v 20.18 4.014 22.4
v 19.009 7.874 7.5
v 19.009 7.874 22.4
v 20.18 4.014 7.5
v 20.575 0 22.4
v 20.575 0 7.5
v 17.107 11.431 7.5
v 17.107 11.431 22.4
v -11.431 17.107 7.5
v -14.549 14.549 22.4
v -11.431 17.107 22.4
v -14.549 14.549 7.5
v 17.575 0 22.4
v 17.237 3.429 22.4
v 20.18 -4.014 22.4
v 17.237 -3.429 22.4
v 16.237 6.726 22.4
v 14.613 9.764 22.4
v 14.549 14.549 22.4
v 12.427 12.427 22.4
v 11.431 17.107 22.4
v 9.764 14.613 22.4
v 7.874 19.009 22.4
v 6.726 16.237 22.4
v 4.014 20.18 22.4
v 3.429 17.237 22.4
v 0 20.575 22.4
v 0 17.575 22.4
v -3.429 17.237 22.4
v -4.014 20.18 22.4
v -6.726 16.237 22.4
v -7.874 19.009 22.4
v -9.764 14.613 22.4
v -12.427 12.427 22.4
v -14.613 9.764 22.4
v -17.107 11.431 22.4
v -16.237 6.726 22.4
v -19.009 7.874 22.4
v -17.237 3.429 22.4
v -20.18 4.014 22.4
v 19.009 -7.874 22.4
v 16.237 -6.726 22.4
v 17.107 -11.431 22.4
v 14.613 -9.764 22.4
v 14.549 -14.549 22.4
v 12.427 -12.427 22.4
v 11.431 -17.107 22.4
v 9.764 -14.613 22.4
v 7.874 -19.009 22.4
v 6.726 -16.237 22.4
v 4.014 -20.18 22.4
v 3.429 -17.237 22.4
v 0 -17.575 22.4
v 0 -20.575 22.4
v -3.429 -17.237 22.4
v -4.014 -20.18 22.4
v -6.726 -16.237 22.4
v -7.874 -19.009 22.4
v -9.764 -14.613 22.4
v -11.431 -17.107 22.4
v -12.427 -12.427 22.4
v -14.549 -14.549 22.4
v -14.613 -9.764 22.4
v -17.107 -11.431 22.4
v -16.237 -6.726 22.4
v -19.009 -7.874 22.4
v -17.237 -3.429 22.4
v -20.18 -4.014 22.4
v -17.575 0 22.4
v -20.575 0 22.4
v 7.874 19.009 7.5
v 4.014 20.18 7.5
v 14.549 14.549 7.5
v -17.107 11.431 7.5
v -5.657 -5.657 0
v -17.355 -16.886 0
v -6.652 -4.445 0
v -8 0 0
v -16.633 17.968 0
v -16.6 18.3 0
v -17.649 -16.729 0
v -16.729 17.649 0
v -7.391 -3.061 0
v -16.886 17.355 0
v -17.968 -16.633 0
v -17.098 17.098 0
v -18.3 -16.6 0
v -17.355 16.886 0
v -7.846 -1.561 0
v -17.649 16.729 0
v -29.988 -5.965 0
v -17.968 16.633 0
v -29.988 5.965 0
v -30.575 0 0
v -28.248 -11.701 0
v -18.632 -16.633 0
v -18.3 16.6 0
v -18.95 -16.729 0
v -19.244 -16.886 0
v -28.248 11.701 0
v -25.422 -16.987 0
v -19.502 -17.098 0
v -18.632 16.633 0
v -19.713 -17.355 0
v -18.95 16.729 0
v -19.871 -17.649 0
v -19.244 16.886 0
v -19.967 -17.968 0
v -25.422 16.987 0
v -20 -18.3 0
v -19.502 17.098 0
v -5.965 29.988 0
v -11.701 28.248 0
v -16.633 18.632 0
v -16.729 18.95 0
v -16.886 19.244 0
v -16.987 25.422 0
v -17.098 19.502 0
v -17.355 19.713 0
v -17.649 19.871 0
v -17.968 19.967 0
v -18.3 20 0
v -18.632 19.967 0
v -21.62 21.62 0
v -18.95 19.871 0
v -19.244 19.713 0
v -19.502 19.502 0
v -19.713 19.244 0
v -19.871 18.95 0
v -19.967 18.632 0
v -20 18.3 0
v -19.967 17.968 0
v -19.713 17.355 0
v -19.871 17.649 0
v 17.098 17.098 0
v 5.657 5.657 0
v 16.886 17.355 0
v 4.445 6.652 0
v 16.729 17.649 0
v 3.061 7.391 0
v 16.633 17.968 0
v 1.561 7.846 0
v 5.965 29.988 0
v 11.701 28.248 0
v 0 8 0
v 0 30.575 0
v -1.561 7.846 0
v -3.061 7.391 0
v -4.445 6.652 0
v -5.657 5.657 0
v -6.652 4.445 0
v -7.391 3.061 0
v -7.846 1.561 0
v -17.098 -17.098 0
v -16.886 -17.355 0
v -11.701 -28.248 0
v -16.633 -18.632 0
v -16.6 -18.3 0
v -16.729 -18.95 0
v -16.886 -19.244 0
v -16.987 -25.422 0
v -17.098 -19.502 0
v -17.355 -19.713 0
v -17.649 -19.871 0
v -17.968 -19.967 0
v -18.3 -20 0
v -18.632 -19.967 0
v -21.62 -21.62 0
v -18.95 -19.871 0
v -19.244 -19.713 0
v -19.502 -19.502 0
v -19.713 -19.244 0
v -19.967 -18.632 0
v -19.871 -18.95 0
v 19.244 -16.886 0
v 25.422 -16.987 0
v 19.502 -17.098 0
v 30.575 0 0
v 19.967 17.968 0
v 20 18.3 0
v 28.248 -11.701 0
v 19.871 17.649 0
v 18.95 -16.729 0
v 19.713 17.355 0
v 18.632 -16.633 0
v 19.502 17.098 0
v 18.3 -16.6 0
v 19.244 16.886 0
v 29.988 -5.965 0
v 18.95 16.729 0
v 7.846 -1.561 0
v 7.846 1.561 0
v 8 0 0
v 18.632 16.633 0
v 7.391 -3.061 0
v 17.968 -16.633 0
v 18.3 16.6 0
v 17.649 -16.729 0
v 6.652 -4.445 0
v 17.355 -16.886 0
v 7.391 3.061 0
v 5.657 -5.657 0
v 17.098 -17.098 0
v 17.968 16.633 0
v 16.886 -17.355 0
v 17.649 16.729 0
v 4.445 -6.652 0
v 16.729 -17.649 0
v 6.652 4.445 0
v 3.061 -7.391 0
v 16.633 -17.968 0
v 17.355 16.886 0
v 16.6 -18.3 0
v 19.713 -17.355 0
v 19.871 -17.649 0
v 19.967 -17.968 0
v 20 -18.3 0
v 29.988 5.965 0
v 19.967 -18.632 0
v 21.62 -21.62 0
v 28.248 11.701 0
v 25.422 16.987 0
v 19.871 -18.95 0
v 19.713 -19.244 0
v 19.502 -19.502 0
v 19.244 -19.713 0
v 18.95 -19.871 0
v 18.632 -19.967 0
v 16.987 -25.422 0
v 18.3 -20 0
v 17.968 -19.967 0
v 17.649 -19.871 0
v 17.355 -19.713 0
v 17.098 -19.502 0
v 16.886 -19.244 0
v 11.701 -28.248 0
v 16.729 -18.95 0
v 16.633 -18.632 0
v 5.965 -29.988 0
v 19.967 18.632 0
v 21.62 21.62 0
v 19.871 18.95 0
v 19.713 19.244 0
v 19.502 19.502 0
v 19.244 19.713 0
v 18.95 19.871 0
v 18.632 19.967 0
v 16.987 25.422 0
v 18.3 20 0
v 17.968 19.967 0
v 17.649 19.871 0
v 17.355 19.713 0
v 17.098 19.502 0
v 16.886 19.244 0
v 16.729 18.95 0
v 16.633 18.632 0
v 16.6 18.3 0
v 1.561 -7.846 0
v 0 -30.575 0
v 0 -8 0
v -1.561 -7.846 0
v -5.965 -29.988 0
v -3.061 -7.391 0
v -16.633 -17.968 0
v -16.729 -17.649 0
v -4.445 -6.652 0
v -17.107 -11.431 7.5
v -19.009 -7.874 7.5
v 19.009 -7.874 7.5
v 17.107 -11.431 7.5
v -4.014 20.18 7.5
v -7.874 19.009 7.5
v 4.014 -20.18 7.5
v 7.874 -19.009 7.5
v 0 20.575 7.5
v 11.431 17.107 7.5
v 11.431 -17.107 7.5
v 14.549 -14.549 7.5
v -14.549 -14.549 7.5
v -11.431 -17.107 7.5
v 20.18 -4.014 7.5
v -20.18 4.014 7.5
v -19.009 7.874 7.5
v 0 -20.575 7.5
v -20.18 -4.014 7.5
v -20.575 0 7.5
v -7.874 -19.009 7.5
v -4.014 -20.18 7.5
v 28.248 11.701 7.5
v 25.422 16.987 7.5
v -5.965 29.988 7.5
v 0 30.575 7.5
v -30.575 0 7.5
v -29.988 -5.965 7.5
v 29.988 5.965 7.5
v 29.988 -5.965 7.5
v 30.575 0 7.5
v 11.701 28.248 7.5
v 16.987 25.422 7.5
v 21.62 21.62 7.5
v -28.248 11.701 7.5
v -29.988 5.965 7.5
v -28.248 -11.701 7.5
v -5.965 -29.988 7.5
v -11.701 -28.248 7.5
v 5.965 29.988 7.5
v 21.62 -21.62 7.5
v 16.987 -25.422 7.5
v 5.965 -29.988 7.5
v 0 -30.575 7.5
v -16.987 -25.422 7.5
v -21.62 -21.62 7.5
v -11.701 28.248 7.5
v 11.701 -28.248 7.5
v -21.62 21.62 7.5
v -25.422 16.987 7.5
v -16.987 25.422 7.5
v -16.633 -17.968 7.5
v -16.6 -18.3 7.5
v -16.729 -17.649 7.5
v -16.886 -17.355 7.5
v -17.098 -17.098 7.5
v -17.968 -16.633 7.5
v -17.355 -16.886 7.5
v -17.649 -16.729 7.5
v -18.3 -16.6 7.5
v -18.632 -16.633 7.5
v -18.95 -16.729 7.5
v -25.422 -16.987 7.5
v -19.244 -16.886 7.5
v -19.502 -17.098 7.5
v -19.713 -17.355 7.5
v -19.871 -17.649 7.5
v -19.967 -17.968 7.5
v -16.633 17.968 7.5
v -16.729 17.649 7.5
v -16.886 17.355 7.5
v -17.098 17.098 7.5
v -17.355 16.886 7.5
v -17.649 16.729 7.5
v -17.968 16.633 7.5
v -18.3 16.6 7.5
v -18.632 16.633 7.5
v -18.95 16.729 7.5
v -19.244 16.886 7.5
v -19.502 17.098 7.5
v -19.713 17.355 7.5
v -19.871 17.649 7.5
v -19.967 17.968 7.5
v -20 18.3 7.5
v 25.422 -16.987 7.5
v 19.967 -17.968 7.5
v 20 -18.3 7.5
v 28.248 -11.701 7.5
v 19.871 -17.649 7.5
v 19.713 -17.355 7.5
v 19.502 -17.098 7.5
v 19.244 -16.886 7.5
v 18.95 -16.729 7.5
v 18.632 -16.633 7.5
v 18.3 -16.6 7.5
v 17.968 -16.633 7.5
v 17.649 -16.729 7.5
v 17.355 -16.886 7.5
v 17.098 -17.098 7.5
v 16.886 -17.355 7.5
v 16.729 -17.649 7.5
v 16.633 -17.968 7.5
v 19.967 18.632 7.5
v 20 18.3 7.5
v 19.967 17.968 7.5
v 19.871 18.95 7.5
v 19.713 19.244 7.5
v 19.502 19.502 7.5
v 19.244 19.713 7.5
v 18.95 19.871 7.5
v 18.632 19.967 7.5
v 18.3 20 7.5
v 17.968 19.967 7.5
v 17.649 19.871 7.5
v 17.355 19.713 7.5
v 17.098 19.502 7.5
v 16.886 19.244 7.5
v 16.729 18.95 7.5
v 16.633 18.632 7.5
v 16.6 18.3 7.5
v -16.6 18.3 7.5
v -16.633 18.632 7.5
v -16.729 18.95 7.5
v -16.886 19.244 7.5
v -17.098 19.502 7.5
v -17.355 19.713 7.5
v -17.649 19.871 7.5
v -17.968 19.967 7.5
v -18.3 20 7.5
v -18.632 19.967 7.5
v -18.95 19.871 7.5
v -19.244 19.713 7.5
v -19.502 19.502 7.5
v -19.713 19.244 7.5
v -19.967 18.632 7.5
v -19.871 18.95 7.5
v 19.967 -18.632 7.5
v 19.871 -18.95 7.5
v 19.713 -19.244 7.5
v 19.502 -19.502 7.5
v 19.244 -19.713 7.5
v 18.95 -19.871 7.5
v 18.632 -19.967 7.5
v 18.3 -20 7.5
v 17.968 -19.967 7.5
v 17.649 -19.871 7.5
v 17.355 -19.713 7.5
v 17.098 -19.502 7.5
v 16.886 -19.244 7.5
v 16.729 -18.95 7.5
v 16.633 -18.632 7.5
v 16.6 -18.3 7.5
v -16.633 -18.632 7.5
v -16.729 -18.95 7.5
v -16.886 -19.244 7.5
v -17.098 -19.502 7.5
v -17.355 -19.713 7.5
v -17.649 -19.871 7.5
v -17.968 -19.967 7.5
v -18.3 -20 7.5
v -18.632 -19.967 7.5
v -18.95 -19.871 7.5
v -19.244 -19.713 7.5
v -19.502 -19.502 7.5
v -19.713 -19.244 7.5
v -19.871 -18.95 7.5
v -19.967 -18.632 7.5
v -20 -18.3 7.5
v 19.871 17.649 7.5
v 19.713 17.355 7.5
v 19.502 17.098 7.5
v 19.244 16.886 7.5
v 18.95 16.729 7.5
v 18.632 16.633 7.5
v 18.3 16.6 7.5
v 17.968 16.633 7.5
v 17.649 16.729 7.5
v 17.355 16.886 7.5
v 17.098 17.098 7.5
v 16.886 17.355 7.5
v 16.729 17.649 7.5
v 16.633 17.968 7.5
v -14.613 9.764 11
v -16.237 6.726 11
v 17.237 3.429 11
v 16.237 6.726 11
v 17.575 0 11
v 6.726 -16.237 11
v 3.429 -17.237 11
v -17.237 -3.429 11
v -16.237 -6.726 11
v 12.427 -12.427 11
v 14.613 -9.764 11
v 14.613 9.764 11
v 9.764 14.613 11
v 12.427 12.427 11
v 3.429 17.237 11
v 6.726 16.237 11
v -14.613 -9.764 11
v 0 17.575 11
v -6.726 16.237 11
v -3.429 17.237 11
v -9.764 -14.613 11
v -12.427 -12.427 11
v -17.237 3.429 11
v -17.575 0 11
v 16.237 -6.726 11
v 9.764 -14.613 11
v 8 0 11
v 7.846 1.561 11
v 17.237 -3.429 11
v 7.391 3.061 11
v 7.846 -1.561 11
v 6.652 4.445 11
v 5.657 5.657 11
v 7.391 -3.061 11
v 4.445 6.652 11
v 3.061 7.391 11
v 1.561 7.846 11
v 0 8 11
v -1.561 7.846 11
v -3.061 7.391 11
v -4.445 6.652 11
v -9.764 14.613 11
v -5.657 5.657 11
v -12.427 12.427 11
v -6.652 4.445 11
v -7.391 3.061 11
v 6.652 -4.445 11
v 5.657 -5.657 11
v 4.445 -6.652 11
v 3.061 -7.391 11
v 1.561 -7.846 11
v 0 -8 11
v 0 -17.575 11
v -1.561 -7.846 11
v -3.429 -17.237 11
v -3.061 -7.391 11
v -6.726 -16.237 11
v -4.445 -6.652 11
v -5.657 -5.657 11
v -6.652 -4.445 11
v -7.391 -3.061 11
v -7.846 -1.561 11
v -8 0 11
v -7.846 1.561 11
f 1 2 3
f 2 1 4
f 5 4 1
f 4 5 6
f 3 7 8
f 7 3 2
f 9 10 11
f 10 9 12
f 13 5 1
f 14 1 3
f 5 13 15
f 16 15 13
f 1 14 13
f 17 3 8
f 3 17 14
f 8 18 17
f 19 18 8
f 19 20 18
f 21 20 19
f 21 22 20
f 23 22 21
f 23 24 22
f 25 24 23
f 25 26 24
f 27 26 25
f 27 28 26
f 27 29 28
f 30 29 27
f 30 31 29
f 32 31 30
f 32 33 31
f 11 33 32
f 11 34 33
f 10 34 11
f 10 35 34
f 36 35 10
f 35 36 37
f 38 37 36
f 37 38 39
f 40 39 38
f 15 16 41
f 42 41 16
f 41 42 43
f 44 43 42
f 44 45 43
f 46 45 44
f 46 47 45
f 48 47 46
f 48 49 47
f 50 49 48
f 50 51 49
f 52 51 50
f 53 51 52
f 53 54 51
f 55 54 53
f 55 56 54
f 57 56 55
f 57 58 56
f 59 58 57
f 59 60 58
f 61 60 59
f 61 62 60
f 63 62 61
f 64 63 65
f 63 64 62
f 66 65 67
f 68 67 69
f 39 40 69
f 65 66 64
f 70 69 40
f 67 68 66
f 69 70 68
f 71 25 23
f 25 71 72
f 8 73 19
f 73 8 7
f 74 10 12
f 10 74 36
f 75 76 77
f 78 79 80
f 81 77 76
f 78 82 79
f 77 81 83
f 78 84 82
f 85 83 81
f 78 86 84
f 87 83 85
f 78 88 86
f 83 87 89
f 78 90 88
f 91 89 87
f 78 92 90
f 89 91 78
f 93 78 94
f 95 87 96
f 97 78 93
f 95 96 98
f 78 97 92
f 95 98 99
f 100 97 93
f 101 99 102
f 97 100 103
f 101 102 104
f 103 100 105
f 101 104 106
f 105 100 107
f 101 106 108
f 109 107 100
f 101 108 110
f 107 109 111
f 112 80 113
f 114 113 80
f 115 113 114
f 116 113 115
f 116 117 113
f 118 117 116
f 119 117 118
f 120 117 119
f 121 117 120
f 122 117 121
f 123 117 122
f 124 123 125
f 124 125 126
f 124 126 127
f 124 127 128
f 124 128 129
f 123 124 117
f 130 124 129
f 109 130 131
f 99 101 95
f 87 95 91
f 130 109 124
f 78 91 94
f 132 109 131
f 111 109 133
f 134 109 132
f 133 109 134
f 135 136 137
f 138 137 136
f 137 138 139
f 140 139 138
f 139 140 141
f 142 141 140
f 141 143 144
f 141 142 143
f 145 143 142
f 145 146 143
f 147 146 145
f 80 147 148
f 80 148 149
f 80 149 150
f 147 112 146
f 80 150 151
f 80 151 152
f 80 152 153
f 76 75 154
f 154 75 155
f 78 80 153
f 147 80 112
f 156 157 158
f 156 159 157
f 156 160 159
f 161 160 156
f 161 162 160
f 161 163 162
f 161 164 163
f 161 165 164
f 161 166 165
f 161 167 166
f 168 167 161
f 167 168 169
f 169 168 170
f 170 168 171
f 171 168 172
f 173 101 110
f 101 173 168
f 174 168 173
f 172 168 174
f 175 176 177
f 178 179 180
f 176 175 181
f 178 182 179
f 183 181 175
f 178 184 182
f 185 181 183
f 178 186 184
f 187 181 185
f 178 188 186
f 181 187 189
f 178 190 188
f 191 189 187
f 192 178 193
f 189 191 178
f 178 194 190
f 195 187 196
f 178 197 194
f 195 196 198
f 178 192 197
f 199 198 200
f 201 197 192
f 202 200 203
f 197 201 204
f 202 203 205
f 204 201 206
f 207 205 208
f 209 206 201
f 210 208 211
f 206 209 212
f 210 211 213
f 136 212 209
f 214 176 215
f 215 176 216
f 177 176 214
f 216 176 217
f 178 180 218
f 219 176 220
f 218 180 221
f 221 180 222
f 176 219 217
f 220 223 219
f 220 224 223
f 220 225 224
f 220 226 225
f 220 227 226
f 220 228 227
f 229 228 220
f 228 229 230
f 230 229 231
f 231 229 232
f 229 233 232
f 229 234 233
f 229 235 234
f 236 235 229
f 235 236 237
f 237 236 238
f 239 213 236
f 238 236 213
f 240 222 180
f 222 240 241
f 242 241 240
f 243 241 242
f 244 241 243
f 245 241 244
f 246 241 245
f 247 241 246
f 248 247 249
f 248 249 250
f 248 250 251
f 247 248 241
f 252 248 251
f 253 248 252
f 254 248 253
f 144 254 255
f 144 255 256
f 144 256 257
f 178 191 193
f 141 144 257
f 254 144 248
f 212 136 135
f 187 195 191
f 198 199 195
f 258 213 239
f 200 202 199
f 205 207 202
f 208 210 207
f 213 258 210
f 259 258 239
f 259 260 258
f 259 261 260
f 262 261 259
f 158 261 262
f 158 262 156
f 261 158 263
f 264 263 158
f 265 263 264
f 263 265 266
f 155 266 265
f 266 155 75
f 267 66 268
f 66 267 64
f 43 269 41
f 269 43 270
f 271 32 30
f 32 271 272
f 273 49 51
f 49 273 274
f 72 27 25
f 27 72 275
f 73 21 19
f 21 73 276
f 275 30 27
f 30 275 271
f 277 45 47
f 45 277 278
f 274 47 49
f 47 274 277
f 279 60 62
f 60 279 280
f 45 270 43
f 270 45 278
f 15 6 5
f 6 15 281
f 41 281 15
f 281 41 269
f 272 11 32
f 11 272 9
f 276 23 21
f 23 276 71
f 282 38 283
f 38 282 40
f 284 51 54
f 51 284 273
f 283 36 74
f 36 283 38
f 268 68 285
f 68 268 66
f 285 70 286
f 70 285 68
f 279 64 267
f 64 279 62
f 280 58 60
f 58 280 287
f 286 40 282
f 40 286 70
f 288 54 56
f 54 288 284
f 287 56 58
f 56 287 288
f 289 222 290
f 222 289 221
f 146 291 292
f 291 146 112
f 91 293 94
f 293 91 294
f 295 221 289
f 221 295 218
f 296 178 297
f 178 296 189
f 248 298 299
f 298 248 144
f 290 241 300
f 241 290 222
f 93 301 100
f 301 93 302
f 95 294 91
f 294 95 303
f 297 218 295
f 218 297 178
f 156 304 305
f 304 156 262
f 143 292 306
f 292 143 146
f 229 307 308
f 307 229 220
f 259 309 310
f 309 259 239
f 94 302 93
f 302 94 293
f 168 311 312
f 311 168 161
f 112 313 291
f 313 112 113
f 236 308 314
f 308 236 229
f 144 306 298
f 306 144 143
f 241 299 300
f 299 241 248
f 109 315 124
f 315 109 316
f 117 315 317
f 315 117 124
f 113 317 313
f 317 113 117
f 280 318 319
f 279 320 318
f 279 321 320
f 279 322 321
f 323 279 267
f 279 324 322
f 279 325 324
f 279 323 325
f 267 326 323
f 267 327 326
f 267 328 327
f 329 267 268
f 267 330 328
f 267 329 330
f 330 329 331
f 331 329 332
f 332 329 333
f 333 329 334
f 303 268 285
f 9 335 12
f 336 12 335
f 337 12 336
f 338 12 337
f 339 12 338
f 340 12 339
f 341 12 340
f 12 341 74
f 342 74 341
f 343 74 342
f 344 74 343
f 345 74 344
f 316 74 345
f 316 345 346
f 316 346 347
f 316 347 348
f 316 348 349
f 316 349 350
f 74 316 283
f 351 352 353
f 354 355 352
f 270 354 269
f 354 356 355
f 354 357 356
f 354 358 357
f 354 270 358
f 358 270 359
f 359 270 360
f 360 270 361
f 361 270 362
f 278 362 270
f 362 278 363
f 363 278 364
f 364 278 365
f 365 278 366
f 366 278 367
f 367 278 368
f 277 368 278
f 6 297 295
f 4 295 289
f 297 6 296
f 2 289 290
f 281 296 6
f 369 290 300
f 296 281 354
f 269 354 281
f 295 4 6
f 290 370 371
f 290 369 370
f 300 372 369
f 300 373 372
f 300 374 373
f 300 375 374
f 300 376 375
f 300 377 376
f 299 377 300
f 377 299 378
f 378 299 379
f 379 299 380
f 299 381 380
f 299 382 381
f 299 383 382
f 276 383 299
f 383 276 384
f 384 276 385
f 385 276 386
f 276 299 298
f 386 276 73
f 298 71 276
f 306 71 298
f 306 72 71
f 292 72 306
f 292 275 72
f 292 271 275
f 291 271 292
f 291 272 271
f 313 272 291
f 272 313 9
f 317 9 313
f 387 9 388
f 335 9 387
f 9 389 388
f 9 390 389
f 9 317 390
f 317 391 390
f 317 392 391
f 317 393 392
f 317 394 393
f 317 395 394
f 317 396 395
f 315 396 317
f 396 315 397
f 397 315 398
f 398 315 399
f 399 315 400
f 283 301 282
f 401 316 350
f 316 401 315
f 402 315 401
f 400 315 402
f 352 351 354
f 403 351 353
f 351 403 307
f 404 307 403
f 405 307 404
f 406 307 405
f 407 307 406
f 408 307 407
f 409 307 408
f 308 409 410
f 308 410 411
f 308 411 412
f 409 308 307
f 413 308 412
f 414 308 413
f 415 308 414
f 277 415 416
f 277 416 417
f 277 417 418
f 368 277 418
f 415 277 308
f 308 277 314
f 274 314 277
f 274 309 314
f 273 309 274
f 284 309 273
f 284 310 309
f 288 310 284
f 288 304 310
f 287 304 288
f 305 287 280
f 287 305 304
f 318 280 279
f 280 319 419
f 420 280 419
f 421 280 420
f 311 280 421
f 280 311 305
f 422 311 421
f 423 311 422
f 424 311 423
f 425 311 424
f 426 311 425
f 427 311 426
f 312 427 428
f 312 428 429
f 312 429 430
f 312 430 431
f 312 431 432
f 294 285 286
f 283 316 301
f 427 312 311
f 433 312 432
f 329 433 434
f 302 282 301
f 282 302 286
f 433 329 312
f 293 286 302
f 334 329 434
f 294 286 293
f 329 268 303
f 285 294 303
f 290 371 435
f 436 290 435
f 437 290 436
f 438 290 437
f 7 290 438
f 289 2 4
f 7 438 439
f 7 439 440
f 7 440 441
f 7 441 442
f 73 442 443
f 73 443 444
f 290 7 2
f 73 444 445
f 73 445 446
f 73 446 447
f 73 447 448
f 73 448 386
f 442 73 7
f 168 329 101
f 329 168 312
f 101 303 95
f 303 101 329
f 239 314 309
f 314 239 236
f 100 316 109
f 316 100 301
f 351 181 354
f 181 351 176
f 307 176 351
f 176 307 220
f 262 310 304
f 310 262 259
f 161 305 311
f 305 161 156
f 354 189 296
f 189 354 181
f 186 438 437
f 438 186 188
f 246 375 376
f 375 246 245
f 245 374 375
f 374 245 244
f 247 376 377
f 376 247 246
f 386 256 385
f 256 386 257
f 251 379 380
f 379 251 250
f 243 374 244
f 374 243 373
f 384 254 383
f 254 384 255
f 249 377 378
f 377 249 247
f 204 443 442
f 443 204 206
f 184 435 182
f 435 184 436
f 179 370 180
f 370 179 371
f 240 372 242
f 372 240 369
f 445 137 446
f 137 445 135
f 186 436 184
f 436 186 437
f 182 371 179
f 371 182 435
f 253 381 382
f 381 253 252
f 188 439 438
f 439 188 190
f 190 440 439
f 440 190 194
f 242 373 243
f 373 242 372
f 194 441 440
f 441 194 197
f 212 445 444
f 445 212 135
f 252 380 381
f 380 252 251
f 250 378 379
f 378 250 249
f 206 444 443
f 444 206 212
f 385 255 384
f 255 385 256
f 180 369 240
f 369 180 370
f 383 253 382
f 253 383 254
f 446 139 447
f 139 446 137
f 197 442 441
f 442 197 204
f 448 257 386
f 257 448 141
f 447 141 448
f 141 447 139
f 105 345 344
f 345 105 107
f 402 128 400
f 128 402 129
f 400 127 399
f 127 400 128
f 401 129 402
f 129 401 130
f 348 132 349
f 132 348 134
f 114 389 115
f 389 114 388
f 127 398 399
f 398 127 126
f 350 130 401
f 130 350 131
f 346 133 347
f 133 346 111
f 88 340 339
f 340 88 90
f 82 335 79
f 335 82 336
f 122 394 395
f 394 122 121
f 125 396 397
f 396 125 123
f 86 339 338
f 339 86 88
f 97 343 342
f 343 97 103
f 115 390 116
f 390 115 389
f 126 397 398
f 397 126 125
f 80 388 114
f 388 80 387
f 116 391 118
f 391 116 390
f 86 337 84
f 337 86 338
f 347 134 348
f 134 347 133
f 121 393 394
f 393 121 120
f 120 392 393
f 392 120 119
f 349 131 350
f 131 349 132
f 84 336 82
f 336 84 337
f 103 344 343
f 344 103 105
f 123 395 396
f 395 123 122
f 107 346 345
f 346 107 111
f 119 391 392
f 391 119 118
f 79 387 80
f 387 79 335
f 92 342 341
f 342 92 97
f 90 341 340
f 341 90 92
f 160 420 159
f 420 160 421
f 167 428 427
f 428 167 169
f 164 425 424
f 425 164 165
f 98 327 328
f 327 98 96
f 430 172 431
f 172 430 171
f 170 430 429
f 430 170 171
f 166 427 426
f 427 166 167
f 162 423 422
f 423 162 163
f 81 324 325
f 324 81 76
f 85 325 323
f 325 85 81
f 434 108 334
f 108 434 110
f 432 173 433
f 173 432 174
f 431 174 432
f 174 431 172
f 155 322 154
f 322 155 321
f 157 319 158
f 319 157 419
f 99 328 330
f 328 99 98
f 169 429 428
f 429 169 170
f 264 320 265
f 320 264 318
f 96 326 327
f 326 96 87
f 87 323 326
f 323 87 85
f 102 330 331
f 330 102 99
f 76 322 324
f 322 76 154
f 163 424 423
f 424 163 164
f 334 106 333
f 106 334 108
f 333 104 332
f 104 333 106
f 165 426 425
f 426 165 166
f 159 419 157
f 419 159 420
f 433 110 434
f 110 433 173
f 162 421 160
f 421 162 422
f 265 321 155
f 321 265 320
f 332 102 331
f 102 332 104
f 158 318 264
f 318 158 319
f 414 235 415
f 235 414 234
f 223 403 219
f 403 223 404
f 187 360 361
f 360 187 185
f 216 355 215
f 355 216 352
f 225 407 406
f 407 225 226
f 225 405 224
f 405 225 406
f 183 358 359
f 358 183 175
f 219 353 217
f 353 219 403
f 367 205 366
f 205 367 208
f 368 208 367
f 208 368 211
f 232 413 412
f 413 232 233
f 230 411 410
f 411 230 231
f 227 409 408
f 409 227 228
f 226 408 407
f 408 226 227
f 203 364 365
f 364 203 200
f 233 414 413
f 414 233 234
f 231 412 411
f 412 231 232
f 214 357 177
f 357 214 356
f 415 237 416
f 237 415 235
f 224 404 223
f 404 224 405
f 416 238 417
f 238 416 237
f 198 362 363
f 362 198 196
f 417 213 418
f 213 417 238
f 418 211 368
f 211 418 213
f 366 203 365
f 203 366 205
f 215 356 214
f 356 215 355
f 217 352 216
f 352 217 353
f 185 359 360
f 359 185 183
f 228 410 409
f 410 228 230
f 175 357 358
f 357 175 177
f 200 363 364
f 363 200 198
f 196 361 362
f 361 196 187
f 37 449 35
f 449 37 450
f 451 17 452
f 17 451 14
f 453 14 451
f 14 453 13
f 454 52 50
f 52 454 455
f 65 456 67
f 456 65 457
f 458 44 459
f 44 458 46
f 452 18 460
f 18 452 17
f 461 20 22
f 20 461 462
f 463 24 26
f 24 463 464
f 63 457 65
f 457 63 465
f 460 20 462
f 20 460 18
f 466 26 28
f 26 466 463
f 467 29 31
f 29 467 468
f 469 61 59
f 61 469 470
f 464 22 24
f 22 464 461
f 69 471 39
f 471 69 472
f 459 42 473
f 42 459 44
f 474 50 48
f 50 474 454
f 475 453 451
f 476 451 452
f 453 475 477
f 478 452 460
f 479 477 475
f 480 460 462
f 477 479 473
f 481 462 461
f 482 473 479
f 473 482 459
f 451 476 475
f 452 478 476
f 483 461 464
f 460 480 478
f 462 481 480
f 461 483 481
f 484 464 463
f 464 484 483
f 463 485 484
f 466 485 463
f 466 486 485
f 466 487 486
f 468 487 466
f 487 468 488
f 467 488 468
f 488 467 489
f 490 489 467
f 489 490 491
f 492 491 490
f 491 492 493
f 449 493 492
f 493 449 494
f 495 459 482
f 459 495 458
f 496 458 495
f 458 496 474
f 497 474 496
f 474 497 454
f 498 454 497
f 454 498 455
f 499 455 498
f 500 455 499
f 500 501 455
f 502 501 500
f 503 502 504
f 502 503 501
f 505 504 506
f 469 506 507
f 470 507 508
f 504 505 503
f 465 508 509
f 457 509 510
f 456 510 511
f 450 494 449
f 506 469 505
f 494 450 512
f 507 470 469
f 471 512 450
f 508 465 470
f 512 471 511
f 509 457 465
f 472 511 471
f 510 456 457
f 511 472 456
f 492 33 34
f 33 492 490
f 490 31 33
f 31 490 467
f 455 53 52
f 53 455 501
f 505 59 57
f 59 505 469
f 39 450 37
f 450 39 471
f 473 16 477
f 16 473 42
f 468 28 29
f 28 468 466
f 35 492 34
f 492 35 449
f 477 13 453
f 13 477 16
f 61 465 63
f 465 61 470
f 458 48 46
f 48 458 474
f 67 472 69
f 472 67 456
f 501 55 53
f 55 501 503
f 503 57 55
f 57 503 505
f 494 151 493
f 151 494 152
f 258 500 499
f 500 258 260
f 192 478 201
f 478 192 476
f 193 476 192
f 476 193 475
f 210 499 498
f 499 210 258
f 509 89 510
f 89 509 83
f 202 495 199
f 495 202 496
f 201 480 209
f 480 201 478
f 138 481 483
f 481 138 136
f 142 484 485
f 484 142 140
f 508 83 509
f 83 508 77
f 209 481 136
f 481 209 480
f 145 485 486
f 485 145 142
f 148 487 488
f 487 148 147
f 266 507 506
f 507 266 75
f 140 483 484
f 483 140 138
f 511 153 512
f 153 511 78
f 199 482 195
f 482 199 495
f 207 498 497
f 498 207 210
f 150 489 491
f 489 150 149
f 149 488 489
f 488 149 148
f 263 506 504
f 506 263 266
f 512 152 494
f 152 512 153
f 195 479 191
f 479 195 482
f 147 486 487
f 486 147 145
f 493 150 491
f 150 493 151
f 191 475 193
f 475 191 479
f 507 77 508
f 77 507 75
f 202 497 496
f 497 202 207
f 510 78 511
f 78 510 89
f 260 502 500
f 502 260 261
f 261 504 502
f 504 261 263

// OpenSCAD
$fn = 32;

// ----------------------------------------------------------------------
// Bearing housing: seat for 6202 (35 x 11 mm), 41.15 mm body
// ----------------------------------------------------------------------

// --- parameters (mm) ---
case_d = 41.15;           // housing outside diameter
case_h = 22.4;            // overall housing height
rim_t = 3;                // wall thickness
bearing_seat = 35.15;     // 6202 seat, 0.15 mm clearance
seat_h = 11.4;            // pocket depth
shoulder = 5;             // shoulder under the bearing
pass_d = 16;              // shaft passage
ear_d = 61.15;            // mounting flange diameter
flange_t = 6;             // flange thickness
bolt_d = 3.4;             // flange bolt clearance
bolt_r = 25.88;           // flange bolt circle radius

module body() {
  cylinder(h = case_h, d = case_d);
}

module flange() {
  /* flange sunk 1.5 mm into the body */
  cylinder(h = flange_t + 1.5, d = ear_d);
}

difference() {
  union() {
    body();
    flange();
  }
  translate([0, 0, case_h - seat_h]) cylinder(h = seat_h + 1, d = bearing_seat);
  translate([0, 0, -1]) cylinder(h = case_h - seat_h + 1, d = pass_d);
  for (i = [0 : 3]) rotate([0, 0, 45 + i * 90]) translate([bolt_r, 0, -1])
    cylinder(h = flange_t + 3, d = bolt_d);
}
